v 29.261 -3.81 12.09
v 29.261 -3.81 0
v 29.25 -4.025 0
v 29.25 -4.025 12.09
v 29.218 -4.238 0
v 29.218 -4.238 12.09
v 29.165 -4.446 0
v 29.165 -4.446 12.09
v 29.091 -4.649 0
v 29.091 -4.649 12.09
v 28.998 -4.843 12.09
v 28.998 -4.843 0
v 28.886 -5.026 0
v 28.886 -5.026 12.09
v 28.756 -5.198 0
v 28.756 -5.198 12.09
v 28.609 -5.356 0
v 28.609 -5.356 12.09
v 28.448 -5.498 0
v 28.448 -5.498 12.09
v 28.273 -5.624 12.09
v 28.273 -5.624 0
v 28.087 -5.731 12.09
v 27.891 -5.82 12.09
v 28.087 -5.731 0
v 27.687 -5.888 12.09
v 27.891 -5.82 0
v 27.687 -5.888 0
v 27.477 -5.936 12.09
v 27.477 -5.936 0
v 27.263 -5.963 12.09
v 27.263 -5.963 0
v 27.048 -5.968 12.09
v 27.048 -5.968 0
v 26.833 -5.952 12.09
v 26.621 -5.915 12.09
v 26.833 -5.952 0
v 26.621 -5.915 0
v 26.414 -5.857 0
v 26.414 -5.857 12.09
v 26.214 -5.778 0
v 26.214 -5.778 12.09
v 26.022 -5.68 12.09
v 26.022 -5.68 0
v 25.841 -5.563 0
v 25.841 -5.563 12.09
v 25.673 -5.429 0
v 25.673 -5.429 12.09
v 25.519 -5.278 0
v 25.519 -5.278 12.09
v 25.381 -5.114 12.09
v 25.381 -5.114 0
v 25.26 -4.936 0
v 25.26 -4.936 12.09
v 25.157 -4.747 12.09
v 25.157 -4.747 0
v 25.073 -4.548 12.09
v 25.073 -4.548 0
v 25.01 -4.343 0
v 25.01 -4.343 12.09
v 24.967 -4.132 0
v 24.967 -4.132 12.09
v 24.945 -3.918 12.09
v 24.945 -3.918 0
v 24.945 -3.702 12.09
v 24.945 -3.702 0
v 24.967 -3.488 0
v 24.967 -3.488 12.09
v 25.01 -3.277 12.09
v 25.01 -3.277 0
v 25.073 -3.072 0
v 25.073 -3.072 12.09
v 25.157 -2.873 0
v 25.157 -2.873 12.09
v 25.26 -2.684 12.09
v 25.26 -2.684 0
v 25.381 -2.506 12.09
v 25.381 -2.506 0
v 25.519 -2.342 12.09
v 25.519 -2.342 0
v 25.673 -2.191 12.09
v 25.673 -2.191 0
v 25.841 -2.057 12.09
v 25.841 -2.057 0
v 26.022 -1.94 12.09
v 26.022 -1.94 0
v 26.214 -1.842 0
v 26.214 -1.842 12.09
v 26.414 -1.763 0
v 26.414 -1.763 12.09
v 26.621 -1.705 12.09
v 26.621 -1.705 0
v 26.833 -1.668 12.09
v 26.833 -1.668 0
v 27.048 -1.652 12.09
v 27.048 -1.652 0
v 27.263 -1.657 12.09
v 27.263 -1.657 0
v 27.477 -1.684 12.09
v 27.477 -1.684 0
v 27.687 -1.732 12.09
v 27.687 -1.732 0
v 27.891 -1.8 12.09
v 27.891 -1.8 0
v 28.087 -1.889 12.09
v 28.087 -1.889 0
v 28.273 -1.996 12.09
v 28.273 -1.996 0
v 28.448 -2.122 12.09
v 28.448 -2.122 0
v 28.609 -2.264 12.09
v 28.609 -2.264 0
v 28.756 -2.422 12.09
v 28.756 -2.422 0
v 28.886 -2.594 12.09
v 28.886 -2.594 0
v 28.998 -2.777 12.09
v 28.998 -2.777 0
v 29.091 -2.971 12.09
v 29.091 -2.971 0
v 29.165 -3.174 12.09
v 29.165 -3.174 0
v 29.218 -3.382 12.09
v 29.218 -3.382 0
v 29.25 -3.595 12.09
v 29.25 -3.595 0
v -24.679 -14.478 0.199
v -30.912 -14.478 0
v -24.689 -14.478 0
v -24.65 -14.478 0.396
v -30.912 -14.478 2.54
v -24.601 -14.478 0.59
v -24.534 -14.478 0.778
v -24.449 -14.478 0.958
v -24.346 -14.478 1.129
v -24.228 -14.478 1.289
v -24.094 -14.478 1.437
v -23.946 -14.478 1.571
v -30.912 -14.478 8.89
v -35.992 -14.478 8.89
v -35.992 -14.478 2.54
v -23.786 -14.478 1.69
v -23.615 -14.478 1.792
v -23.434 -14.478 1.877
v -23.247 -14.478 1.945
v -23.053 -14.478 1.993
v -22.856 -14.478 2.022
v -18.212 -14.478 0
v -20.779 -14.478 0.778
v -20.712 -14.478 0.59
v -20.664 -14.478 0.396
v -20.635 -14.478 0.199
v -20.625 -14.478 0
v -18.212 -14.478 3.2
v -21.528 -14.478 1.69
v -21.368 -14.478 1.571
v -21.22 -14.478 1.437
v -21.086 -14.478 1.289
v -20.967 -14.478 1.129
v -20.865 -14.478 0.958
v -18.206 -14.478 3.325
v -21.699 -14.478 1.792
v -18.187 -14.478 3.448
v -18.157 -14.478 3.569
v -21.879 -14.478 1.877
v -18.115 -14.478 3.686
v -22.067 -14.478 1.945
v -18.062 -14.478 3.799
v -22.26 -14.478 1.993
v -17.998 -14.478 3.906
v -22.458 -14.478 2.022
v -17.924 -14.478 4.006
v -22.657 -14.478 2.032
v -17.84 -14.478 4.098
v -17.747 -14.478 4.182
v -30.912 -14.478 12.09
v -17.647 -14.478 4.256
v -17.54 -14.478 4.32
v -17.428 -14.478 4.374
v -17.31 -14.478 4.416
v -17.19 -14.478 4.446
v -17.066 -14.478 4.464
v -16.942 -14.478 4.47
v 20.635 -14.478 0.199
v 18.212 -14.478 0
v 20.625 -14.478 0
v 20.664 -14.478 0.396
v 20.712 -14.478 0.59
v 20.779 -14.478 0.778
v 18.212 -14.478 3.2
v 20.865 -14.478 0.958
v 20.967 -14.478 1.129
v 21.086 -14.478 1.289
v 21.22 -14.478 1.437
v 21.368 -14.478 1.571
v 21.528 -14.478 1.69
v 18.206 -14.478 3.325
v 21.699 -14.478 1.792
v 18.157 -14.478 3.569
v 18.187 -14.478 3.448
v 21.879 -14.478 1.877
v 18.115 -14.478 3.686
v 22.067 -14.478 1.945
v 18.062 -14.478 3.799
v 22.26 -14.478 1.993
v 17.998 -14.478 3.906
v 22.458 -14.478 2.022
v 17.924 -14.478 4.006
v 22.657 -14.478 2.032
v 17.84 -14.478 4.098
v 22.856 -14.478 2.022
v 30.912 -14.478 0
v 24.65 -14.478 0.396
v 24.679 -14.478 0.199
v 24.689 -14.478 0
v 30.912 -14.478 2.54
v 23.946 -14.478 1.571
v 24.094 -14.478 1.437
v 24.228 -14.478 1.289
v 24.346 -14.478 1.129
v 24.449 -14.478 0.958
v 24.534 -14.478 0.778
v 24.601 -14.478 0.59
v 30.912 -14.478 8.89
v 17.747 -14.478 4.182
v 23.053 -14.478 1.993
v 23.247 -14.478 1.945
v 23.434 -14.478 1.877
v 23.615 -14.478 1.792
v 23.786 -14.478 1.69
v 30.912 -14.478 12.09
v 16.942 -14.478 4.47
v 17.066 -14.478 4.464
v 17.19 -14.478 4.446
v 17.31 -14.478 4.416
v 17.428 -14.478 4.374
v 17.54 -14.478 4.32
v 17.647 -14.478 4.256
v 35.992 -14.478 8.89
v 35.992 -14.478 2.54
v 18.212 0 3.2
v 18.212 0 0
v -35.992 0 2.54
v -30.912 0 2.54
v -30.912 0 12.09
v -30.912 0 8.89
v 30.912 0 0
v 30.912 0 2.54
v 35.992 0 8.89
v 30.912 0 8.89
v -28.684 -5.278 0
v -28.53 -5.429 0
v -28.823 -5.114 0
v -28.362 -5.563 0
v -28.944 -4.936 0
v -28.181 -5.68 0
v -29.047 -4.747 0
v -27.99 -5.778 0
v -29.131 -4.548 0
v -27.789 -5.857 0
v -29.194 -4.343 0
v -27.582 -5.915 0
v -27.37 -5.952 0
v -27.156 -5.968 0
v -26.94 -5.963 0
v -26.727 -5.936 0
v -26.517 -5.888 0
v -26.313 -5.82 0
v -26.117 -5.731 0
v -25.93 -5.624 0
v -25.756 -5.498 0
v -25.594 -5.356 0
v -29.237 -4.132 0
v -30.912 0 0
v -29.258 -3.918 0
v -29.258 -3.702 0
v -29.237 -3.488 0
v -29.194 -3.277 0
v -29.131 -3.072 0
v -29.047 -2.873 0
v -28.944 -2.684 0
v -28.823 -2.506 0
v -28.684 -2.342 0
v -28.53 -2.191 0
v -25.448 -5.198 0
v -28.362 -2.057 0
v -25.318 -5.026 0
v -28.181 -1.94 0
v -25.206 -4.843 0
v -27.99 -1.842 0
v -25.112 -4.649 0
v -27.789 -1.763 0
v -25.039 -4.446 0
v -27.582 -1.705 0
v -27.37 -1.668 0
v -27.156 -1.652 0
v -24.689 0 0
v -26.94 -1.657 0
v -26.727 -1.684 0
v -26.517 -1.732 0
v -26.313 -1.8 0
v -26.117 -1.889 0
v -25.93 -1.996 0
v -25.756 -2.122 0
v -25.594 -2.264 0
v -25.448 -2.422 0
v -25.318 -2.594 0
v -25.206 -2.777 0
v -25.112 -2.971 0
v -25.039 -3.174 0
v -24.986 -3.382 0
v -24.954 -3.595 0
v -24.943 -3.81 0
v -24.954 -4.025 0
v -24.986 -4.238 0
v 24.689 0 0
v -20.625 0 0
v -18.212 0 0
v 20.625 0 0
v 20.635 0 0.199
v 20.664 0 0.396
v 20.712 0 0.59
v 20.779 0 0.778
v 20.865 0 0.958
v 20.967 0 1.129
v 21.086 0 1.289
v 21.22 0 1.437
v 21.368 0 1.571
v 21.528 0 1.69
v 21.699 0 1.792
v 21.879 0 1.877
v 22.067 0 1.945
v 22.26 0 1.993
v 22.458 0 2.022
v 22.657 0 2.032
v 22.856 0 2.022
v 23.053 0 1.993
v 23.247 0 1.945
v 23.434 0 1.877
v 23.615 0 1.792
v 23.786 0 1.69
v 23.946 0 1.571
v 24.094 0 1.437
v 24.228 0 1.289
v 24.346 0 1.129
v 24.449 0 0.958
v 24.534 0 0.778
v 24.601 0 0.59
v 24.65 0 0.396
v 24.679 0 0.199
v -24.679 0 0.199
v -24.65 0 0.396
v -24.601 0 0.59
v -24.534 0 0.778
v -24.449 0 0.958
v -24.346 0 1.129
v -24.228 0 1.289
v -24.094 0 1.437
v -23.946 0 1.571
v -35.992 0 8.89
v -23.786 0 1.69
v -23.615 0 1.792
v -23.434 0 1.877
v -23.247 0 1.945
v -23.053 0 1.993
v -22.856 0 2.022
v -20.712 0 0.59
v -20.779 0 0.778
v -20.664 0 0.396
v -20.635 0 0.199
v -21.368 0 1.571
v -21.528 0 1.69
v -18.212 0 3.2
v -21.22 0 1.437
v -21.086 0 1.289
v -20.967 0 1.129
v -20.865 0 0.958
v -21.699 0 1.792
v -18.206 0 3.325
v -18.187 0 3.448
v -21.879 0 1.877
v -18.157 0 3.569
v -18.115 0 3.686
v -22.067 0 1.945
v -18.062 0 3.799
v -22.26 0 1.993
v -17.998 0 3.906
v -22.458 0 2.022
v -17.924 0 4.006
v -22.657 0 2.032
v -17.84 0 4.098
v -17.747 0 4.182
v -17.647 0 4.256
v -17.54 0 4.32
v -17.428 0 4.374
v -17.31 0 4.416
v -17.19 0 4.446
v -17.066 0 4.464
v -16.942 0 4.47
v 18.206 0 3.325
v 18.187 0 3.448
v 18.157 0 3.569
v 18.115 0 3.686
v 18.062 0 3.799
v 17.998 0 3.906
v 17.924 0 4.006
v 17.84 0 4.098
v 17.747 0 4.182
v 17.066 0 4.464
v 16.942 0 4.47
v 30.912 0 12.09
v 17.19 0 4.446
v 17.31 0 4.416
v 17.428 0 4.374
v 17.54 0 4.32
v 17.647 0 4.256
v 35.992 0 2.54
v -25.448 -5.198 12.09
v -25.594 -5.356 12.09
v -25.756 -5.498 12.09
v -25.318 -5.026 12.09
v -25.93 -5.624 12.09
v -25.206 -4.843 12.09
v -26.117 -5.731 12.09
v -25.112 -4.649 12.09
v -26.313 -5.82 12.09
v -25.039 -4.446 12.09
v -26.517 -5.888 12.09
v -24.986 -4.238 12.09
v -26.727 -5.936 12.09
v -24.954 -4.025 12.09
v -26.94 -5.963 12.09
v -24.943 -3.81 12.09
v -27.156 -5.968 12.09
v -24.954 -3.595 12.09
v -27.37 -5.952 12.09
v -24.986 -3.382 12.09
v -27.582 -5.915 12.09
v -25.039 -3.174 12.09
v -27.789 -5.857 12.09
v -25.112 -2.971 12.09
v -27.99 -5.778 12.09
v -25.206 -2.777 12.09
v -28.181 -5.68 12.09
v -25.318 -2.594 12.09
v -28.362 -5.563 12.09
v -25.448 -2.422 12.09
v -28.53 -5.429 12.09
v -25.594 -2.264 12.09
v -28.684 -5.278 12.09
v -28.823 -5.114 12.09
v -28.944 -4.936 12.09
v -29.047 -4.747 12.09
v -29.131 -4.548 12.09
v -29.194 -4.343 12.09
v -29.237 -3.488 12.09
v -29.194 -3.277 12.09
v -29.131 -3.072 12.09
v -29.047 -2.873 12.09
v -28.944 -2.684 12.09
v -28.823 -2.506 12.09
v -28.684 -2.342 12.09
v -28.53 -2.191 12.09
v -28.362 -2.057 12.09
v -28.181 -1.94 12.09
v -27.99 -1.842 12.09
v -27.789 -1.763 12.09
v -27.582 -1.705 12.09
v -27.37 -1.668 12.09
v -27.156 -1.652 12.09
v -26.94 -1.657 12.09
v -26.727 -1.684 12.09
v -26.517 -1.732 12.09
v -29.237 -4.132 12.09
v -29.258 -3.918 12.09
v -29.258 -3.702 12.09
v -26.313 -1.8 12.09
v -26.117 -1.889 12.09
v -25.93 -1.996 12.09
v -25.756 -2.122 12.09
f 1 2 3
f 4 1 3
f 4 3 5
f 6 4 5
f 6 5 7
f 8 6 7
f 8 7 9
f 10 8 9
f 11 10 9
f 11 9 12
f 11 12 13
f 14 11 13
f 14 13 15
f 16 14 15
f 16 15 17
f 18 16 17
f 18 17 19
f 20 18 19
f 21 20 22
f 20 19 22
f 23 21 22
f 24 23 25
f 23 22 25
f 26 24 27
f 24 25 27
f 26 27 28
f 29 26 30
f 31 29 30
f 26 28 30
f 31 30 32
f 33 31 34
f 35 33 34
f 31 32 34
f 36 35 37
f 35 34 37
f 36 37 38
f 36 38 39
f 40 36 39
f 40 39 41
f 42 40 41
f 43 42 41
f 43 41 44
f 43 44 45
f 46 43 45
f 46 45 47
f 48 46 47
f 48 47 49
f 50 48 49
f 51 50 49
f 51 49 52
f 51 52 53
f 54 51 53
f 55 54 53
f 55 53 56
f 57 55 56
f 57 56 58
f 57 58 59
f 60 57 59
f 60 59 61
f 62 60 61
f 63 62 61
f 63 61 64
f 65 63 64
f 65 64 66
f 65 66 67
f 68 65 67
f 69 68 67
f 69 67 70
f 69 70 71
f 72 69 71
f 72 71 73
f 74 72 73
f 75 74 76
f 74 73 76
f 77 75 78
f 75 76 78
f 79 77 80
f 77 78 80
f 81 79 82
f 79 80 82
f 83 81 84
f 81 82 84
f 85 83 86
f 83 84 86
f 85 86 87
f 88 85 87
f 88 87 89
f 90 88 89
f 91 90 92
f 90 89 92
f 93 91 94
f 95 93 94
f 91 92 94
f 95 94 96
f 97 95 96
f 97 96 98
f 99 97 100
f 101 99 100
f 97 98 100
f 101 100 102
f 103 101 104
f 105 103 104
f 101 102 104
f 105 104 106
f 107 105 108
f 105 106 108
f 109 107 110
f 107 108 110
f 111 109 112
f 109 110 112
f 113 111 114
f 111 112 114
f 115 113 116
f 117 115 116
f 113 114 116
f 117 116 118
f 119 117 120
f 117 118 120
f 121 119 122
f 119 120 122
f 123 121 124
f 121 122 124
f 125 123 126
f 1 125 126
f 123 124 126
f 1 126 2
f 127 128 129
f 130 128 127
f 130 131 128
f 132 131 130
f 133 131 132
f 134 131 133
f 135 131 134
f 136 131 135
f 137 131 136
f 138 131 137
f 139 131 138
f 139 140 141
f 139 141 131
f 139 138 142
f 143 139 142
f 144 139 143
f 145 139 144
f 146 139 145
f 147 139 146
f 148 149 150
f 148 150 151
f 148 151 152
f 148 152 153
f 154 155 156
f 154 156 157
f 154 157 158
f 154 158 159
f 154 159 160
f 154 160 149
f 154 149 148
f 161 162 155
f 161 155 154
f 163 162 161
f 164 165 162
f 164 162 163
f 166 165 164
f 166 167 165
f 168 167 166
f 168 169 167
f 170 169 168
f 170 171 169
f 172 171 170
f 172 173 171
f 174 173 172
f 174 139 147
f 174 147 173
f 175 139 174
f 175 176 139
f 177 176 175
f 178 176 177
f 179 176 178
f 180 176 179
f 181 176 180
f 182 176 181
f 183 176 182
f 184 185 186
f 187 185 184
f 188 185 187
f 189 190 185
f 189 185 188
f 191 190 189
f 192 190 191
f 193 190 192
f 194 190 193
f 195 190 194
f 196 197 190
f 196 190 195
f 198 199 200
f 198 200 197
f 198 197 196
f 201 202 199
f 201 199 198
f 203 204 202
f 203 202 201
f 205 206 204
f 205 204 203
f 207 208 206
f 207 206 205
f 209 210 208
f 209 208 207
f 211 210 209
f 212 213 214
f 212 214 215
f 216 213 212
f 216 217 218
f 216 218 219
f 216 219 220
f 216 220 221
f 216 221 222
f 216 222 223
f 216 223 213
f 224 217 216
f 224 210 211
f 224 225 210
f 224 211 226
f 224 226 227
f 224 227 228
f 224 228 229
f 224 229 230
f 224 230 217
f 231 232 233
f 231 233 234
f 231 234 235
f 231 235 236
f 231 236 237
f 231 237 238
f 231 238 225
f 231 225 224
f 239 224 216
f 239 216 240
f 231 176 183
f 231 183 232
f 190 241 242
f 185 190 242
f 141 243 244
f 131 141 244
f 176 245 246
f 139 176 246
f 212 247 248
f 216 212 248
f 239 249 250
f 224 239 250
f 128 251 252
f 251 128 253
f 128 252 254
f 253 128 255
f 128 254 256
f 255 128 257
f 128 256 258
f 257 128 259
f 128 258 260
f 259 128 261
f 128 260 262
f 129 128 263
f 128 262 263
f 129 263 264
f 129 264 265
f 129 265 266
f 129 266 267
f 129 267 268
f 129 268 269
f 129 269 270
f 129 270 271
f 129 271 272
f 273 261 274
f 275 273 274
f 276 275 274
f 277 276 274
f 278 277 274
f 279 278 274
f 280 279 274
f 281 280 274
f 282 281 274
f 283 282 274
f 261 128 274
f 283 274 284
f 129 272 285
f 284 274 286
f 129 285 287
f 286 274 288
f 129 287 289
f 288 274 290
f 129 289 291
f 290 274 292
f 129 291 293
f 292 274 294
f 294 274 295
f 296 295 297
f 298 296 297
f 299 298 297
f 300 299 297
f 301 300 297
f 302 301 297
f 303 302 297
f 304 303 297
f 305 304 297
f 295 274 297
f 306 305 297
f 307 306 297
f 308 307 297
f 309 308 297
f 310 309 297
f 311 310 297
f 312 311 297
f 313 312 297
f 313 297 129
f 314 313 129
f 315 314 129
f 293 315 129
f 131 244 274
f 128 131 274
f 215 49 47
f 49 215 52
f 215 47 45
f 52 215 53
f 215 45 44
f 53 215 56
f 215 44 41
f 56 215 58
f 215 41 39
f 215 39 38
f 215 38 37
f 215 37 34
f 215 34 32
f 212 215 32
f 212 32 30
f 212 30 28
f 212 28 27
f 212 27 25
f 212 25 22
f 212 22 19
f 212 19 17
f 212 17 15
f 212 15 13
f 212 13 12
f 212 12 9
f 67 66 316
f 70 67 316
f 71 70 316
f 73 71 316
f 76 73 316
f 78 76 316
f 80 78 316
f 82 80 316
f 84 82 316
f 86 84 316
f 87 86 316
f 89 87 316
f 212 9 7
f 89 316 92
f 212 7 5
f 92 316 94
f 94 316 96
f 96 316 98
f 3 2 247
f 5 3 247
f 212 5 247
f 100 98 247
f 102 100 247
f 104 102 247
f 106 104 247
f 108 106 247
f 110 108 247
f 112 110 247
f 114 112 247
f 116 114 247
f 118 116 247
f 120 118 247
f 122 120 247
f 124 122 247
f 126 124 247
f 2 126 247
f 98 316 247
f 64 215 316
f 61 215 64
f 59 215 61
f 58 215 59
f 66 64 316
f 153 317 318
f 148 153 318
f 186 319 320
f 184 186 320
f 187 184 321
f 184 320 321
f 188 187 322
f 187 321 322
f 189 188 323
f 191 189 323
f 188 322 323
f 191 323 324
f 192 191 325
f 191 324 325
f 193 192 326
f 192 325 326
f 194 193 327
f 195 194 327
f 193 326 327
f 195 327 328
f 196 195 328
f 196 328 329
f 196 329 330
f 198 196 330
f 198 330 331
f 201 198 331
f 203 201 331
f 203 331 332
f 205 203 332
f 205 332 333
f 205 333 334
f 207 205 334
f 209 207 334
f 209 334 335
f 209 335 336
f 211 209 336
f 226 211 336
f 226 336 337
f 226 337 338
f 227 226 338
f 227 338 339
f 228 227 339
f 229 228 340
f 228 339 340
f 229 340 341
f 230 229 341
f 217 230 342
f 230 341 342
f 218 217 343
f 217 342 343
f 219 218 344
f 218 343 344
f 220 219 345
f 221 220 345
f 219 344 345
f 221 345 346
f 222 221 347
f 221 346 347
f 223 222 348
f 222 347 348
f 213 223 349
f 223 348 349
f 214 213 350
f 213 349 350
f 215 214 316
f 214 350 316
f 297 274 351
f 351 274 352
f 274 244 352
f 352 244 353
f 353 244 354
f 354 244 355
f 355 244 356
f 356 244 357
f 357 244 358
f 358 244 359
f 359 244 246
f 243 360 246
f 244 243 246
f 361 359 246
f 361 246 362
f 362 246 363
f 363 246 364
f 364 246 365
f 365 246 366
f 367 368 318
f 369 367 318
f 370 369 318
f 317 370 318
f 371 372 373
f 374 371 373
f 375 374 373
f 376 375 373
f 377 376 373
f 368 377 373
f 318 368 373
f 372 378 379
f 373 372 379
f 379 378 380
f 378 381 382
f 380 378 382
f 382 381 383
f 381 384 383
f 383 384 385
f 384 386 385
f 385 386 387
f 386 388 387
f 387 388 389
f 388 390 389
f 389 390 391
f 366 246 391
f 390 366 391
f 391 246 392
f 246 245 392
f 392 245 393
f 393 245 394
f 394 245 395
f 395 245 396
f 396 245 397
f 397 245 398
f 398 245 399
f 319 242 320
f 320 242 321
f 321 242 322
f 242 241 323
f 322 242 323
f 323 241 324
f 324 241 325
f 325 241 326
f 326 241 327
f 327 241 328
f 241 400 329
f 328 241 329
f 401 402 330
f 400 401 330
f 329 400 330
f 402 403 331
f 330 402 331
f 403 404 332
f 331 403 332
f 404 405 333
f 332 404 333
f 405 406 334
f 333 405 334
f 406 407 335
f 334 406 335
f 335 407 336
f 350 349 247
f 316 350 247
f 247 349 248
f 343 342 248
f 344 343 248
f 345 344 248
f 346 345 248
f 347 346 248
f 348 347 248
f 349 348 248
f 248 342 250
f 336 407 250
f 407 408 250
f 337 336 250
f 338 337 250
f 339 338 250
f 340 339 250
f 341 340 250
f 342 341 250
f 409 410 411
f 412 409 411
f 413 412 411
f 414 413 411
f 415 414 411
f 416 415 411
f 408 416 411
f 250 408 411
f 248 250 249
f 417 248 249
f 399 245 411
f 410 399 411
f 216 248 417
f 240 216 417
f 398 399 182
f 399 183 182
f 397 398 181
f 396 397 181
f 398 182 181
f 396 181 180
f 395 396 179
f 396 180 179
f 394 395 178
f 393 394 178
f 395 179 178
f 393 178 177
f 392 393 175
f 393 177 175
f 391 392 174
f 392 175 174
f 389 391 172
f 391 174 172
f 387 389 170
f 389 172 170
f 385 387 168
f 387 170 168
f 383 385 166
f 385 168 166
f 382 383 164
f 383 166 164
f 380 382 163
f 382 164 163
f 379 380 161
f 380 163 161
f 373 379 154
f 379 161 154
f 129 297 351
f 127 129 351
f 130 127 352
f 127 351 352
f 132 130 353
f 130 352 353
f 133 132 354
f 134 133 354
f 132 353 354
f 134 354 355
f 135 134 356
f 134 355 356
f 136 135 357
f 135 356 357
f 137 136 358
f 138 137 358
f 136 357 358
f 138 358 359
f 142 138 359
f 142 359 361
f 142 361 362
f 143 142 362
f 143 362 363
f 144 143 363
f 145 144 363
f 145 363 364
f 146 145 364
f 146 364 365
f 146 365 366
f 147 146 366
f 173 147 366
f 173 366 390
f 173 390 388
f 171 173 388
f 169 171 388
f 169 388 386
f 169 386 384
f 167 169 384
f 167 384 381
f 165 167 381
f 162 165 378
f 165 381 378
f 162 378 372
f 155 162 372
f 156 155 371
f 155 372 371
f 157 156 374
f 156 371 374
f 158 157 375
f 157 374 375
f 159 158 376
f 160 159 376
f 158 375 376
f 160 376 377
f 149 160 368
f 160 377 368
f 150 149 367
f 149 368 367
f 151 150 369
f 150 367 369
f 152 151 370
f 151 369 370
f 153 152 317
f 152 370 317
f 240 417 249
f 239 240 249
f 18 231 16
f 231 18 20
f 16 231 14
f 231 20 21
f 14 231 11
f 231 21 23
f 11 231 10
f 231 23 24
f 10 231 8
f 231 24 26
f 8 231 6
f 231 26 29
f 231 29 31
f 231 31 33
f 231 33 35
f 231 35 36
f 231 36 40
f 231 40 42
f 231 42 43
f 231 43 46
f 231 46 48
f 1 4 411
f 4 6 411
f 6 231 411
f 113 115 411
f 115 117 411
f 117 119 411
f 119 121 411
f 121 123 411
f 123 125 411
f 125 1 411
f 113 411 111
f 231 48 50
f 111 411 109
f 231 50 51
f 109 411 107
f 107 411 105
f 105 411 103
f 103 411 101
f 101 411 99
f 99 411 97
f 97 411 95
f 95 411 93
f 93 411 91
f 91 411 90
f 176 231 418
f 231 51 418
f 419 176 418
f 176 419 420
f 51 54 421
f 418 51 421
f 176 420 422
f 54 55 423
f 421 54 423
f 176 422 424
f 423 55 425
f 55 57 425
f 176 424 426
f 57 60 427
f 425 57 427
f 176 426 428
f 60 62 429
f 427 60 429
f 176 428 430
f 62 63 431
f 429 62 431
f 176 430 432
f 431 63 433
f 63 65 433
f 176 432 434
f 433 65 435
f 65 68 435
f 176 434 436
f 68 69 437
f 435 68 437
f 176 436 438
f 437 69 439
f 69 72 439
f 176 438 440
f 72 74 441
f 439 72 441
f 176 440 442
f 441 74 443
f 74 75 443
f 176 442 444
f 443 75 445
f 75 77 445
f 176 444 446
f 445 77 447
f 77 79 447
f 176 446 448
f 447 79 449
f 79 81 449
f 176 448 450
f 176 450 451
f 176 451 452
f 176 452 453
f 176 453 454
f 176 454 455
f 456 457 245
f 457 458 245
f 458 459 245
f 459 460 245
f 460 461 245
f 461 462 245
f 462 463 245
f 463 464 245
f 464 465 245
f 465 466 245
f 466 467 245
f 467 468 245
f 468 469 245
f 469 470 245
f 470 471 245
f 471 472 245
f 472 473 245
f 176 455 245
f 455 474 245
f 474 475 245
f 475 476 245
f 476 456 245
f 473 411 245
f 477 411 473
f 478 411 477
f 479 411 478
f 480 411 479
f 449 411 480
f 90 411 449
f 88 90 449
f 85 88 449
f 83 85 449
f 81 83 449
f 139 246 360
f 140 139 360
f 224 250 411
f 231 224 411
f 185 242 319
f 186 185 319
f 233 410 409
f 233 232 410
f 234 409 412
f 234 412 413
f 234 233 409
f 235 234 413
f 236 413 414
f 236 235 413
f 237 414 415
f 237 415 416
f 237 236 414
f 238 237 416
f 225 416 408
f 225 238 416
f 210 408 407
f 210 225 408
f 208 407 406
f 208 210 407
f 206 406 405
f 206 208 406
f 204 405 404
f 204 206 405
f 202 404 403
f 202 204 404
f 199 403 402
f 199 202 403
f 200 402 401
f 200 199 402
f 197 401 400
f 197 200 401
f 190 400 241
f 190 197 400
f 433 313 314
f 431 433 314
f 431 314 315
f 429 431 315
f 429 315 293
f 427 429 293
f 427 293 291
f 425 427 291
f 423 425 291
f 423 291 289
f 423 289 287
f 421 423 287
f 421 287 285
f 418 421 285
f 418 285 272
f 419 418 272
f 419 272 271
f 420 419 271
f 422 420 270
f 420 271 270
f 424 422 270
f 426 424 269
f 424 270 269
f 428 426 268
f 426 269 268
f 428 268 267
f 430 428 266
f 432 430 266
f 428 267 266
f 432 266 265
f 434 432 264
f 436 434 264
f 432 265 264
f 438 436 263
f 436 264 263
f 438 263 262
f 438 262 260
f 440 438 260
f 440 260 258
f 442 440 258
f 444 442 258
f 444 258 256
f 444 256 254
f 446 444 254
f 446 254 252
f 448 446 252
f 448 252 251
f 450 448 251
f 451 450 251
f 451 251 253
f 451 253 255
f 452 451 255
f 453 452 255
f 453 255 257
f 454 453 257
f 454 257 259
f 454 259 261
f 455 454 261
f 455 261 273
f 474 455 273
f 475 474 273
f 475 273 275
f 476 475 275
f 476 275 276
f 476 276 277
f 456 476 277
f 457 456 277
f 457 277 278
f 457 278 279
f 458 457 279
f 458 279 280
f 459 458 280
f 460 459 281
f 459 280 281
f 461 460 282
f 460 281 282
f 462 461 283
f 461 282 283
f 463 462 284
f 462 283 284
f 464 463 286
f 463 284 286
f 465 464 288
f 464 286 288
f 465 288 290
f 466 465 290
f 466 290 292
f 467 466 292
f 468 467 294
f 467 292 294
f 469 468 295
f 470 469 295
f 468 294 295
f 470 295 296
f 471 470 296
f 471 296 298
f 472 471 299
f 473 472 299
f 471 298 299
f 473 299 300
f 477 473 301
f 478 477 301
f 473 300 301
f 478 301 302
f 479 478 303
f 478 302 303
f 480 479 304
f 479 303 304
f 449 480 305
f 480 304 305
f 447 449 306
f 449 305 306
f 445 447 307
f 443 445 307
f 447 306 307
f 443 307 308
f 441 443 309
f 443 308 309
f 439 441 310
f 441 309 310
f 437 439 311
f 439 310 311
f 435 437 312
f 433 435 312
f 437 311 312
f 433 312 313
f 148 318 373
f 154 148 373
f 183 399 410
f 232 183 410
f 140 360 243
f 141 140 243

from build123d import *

# Parameters (mm, degrees)
F1_DEPTH = 14.478
F2_R     = 1.27
F3_R     = 2.159
F4_DEPTH = 12.0914
F6_DEPTH = 14.479


with BuildPart() as f1:
    # F0 (on Front) → F1 (new body)
    with BuildSketch(Plane.XZ):
        Polygon((-18.2118, 4.4704), (0, 4.4704), (18.2118, 4.4704), (18.2118, 0), (30.9118, 0), (30.9118, 2.54), (35.9918, 2.54), (35.9918, 8.89), (30.9118, 8.89), (30.9118, 12.0904), (0, 12.0904), (-30.9118, 12.0904), (-30.9118, 8.89), (-35.9918, 8.89), (-35.9918, 2.54), (-30.9118, 2.54), (-30.9118, 0), (-18.2118, 0), align=None)
    extrude(amount=F1_DEPTH)

    # F2
    f2_edges = [f1.edges().sort_by_distance(p)[0] for p in [
        (-18.2118, -7.239, 4.4704),
        (18.2118, -7.239, 4.4704),
    ]]
    fillet(f2_edges, radius=F2_R)

    # F3 (on face) → F4 (cut, through all)
    with BuildSketch(Plane(origin=(0, 0, 0), x_dir=(1, 0, 0), z_dir=(0, 0, -1))):
        with Locations((-27.1018, 3.81)):
            Circle(F3_R)
        with Locations((27.1018, 3.81)):
            Circle(F3_R)
    extrude(amount=-F4_DEPTH, mode=Mode.SUBTRACT)

    # F5 (on face) → F6 (cut, through all)
    with BuildSketch(Plane(origin=(0, 0, 0), x_dir=(-1, 0, 0), z_dir=(0, 1, 0))):
        with BuildLine():
            Line((20.6248, 0), (24.6888, 0))
            ThreePointArc((24.6888, 0), (22.6568, 2.032), (20.6248, 0))
        make_face()
        with BuildLine():
            Line((-24.6888, 0), (-20.6248, 0))
            ThreePointArc((-20.6248, 0), (-22.6568, 2.032), (-24.6888, 0))
        make_face()
    extrude(amount=-F6_DEPTH, mode=Mode.SUBTRACT)


solid = f1.part
